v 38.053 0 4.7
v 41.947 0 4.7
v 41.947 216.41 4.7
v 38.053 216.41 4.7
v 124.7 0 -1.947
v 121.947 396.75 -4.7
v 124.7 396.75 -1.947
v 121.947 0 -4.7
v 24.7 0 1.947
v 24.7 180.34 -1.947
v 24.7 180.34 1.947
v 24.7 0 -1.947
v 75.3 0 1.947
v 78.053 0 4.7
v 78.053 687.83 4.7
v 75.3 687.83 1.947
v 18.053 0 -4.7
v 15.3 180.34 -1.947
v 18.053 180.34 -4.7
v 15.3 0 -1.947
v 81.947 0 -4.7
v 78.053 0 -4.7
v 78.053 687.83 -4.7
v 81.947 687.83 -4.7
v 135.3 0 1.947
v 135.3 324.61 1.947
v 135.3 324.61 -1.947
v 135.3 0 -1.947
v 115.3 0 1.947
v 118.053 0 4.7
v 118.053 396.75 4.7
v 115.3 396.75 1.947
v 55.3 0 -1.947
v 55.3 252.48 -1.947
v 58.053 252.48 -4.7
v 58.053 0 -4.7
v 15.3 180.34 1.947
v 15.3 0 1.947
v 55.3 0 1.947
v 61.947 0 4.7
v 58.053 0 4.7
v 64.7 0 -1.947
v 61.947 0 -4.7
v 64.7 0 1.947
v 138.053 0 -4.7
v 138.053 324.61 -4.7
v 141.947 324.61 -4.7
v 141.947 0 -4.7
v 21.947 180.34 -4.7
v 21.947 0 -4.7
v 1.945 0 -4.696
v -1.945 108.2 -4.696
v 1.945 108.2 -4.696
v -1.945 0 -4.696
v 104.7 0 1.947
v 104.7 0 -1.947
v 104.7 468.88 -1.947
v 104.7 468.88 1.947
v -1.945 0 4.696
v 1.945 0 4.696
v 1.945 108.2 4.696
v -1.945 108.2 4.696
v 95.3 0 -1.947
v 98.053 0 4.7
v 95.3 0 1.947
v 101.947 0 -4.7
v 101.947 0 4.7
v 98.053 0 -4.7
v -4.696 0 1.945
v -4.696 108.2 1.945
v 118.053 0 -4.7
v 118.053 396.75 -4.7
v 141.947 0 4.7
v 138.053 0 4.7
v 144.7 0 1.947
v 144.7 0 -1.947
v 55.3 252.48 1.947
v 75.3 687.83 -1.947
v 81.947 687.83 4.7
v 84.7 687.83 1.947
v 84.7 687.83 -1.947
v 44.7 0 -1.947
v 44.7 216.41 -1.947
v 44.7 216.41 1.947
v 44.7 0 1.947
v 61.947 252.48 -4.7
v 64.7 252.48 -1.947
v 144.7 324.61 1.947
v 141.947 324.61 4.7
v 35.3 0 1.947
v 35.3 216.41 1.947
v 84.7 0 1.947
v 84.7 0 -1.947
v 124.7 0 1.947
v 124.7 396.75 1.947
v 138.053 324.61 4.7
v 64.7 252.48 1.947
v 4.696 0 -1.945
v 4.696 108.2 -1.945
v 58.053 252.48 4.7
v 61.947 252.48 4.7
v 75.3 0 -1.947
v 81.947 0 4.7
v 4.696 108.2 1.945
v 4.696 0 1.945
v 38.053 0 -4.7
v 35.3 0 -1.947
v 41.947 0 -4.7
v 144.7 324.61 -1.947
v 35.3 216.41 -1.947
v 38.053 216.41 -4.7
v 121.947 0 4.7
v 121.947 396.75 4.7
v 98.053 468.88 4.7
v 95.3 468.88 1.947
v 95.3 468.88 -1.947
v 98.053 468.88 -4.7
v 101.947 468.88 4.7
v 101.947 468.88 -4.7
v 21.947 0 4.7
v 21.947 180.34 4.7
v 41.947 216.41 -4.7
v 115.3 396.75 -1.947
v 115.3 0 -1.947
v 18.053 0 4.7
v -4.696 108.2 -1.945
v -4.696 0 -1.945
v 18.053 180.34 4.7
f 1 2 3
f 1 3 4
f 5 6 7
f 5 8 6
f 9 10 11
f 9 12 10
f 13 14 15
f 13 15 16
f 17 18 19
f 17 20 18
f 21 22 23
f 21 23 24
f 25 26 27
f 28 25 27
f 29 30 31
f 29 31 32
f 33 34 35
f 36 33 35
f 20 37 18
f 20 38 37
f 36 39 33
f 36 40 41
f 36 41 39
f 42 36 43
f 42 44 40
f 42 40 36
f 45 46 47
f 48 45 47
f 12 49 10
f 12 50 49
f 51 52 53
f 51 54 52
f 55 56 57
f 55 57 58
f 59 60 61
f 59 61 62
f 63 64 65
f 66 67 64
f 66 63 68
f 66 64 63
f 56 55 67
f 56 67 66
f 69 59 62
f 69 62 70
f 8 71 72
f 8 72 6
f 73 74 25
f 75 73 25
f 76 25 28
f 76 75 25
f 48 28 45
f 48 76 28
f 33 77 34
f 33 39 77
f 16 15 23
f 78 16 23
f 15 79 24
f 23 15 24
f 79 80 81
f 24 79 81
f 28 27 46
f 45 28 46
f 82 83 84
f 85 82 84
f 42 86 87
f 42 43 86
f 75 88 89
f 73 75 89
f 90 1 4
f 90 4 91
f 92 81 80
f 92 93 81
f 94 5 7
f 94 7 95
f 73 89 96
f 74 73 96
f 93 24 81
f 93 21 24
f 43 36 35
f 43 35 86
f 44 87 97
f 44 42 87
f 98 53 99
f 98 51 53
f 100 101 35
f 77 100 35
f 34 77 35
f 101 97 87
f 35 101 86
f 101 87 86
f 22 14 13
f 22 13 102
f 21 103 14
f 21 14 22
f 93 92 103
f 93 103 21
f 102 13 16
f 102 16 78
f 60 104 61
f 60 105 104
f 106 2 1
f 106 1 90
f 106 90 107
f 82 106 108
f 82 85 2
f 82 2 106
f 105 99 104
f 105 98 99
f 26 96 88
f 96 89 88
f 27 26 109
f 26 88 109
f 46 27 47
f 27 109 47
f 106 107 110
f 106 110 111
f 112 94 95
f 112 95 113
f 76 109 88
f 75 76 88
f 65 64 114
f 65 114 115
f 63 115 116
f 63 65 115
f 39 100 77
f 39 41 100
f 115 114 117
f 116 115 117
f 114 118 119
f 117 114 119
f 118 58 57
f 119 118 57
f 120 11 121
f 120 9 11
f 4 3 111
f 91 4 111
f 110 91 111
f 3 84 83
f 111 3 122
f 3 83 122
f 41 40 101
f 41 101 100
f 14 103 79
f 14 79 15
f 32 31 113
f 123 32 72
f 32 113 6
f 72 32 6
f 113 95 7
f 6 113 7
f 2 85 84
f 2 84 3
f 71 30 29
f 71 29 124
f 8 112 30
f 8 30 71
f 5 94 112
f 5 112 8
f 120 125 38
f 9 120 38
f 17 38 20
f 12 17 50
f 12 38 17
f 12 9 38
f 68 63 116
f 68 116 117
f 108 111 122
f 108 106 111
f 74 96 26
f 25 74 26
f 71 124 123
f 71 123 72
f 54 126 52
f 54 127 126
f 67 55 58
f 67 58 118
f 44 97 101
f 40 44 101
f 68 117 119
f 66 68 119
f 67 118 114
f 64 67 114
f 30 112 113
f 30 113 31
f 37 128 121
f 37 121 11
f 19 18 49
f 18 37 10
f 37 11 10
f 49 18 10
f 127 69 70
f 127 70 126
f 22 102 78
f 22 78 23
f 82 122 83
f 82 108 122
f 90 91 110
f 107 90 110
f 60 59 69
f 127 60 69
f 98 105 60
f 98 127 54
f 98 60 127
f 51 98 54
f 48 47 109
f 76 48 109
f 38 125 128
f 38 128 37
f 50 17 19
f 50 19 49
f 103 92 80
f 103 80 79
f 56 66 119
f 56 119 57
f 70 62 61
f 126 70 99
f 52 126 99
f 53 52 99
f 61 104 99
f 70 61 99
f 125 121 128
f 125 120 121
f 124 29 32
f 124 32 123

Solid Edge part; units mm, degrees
sketch "Sketch1" plane through (0, 0, 0) normal (0, -1, 0) x (1, 0, 0)
  line L0 (4.6956, 1.945) -> (1.945, 4.6956)
  line L1 (1.945, 4.6956) -> (-1.945, 4.6956)
  line L2 (-1.945, 4.6956) -> (-4.6956, 1.945)
  line L3 (-4.6956, 1.945) -> (-4.6956, -1.945)
  line L4 (-4.6956, -1.945) -> (-1.945, -4.6956)
  line L5 (-1.945, -4.6956) -> (1.945, -4.6956)
  line L6 (1.945, -4.6956) -> (4.6956, -1.945)
  line L7 (4.6956, -1.945) -> (4.6956, 1.945)
extrude "Protrusion1" add sketch "Sketch1" against normal blind 108.2
sketch "Sketch2" plane through (0, 0, 0) normal (0, -1, 0) x (1, 0, 0)
  line L0 (24.7, 1.9468) -> (21.9468, 4.7)
  line L1 (21.9468, 4.7) -> (18.0532, 4.7)
  line L2 (18.0532, 4.7) -> (15.3, 1.9468)
  line L3 (15.3, 1.9468) -> (15.3, -1.9468)
  line L4 (15.3, -1.9468) -> (18.0532, -4.7)
  line L5 (18.0532, -4.7) -> (21.9468, -4.7)
  line L6 (21.9468, -4.7) -> (24.7, -1.9468)
  line L7 (24.7, -1.9468) -> (24.7, 1.9468)
extrude "ExtrudedProtrusion_2" add sketch "Sketch2" against normal blind 180.34
sketch "Sketch3" plane through (0, 0, 0) normal (0, -1, 0) x (1, 0, 0)
  line L0 (44.7, 1.9468) -> (41.9468, 4.7)
  line L1 (41.9468, 4.7) -> (38.0532, 4.7)
  line L2 (38.0532, 4.7) -> (35.3, 1.9468)
  line L3 (35.3, 1.9468) -> (35.3, -1.9468)
  line L4 (35.3, -1.9468) -> (38.0532, -4.7)
  line L5 (38.0532, -4.7) -> (41.9468, -4.7)
  line L6 (41.9468, -4.7) -> (44.7, -1.9468)
  line L7 (44.7, -1.9468) -> (44.7, 1.9468)
extrude "ExtrudedProtrusion_3" add sketch "Sketch3" against normal blind 216.41
sketch "Sketch4" plane through (0, 0, 0) normal (0, -1, 0) x (1, 0, 0)
  line L0 (64.7, 1.9468) -> (61.9468, 4.7)
  line L1 (61.9468, 4.7) -> (58.0532, 4.7)
  line L2 (58.0532, 4.7) -> (55.3, 1.9468)
  line L3 (55.3, 1.9468) -> (55.3, -1.9468)
  line L4 (55.3, -1.9468) -> (58.0532, -4.7)
  line L5 (58.0532, -4.7) -> (61.9468, -4.7)
  line L6 (61.9468, -4.7) -> (64.7, -1.9468)
  line L7 (64.7, -1.9468) -> (64.7, 1.9468)
extrude "ExtrudedProtrusion_4" add sketch "Sketch4" against normal blind 252.48
sketch "Sketch5" plane through (0, 0, 0) normal (0, -1, 0) x (1, 0, 0)
  line L0 (84.7, 1.9468) -> (81.9468, 4.7)
  line L1 (81.9468, 4.7) -> (78.0532, 4.7)
  line L2 (78.0532, 4.7) -> (75.3, 1.9468)
  line L3 (75.3, 1.9468) -> (75.3, -1.9468)
  line L4 (75.3, -1.9468) -> (78.0532, -4.7)
  line L5 (78.0532, -4.7) -> (81.9468, -4.7)
  line L6 (81.9468, -4.7) -> (84.7, -1.9468)
  line L7 (84.7, -1.9468) -> (84.7, 1.9468)
extrude "ExtrudedProtrusion_5" add sketch "Sketch5" against normal blind 687.83
sketch "Sketch6" plane through (0, 0, 0) normal (0, -1, 0) x (1, 0, 0)
  line L0 (104.7, 1.9468) -> (101.9468, 4.7)
  line L1 (101.9468, 4.7) -> (98.0532, 4.7)
  line L2 (98.0532, 4.7) -> (95.3, 1.9468)
  line L3 (95.3, 1.9468) -> (95.3, -1.9468)
  line L4 (95.3, -1.9468) -> (98.0532, -4.7)
  line L5 (98.0532, -4.7) -> (101.9468, -4.7)
  line L6 (101.9468, -4.7) -> (104.7, -1.9468)
  line L7 (104.7, -1.9468) -> (104.7, 1.9468)
extrude "ExtrudedProtrusion_6" add sketch "Sketch6" against normal blind 468.88
sketch "Sketch7" plane through (0, 0, 0) normal (0, -1, 0) x (1, 0, 0)
  line L0 (124.7, 1.9468) -> (121.9468, 4.7)
  line L1 (121.9468, 4.7) -> (118.0532, 4.7)
  line L2 (118.0532, 4.7) -> (115.3, 1.9468)
  line L3 (115.3, 1.9468) -> (115.3, -1.9468)
  line L4 (115.3, -1.9468) -> (118.0532, -4.7)
  line L5 (118.0532, -4.7) -> (121.9468, -4.7)
  line L6 (121.9468, -4.7) -> (124.7, -1.9468)
  line L7 (124.7, -1.9468) -> (124.7, 1.9468)
extrude "ExtrudedProtrusion_7" add sketch "Sketch7" against normal blind 396.75
sketch "Sketch8" plane through (0, 0, 0) normal (0, -1, 0) x (1, 0, 0)
  line L0 (144.7, 1.9468) -> (141.9468, 4.7)
  line L1 (141.9468, 4.7) -> (138.0532, 4.7)
  line L2 (138.0532, 4.7) -> (135.3, 1.9468)
  line L3 (135.3, 1.9468) -> (135.3, -1.9468)
  line L4 (135.3, -1.9468) -> (138.0532, -4.7)
  line L5 (138.0532, -4.7) -> (141.9468, -4.7)
  line L6 (141.9468, -4.7) -> (144.7, -1.9468)
  line L7 (144.7, -1.9468) -> (144.7, 1.9468)
extrude "ExtrudedProtrusion_8" add sketch "Sketch8" against normal blind 324.61
